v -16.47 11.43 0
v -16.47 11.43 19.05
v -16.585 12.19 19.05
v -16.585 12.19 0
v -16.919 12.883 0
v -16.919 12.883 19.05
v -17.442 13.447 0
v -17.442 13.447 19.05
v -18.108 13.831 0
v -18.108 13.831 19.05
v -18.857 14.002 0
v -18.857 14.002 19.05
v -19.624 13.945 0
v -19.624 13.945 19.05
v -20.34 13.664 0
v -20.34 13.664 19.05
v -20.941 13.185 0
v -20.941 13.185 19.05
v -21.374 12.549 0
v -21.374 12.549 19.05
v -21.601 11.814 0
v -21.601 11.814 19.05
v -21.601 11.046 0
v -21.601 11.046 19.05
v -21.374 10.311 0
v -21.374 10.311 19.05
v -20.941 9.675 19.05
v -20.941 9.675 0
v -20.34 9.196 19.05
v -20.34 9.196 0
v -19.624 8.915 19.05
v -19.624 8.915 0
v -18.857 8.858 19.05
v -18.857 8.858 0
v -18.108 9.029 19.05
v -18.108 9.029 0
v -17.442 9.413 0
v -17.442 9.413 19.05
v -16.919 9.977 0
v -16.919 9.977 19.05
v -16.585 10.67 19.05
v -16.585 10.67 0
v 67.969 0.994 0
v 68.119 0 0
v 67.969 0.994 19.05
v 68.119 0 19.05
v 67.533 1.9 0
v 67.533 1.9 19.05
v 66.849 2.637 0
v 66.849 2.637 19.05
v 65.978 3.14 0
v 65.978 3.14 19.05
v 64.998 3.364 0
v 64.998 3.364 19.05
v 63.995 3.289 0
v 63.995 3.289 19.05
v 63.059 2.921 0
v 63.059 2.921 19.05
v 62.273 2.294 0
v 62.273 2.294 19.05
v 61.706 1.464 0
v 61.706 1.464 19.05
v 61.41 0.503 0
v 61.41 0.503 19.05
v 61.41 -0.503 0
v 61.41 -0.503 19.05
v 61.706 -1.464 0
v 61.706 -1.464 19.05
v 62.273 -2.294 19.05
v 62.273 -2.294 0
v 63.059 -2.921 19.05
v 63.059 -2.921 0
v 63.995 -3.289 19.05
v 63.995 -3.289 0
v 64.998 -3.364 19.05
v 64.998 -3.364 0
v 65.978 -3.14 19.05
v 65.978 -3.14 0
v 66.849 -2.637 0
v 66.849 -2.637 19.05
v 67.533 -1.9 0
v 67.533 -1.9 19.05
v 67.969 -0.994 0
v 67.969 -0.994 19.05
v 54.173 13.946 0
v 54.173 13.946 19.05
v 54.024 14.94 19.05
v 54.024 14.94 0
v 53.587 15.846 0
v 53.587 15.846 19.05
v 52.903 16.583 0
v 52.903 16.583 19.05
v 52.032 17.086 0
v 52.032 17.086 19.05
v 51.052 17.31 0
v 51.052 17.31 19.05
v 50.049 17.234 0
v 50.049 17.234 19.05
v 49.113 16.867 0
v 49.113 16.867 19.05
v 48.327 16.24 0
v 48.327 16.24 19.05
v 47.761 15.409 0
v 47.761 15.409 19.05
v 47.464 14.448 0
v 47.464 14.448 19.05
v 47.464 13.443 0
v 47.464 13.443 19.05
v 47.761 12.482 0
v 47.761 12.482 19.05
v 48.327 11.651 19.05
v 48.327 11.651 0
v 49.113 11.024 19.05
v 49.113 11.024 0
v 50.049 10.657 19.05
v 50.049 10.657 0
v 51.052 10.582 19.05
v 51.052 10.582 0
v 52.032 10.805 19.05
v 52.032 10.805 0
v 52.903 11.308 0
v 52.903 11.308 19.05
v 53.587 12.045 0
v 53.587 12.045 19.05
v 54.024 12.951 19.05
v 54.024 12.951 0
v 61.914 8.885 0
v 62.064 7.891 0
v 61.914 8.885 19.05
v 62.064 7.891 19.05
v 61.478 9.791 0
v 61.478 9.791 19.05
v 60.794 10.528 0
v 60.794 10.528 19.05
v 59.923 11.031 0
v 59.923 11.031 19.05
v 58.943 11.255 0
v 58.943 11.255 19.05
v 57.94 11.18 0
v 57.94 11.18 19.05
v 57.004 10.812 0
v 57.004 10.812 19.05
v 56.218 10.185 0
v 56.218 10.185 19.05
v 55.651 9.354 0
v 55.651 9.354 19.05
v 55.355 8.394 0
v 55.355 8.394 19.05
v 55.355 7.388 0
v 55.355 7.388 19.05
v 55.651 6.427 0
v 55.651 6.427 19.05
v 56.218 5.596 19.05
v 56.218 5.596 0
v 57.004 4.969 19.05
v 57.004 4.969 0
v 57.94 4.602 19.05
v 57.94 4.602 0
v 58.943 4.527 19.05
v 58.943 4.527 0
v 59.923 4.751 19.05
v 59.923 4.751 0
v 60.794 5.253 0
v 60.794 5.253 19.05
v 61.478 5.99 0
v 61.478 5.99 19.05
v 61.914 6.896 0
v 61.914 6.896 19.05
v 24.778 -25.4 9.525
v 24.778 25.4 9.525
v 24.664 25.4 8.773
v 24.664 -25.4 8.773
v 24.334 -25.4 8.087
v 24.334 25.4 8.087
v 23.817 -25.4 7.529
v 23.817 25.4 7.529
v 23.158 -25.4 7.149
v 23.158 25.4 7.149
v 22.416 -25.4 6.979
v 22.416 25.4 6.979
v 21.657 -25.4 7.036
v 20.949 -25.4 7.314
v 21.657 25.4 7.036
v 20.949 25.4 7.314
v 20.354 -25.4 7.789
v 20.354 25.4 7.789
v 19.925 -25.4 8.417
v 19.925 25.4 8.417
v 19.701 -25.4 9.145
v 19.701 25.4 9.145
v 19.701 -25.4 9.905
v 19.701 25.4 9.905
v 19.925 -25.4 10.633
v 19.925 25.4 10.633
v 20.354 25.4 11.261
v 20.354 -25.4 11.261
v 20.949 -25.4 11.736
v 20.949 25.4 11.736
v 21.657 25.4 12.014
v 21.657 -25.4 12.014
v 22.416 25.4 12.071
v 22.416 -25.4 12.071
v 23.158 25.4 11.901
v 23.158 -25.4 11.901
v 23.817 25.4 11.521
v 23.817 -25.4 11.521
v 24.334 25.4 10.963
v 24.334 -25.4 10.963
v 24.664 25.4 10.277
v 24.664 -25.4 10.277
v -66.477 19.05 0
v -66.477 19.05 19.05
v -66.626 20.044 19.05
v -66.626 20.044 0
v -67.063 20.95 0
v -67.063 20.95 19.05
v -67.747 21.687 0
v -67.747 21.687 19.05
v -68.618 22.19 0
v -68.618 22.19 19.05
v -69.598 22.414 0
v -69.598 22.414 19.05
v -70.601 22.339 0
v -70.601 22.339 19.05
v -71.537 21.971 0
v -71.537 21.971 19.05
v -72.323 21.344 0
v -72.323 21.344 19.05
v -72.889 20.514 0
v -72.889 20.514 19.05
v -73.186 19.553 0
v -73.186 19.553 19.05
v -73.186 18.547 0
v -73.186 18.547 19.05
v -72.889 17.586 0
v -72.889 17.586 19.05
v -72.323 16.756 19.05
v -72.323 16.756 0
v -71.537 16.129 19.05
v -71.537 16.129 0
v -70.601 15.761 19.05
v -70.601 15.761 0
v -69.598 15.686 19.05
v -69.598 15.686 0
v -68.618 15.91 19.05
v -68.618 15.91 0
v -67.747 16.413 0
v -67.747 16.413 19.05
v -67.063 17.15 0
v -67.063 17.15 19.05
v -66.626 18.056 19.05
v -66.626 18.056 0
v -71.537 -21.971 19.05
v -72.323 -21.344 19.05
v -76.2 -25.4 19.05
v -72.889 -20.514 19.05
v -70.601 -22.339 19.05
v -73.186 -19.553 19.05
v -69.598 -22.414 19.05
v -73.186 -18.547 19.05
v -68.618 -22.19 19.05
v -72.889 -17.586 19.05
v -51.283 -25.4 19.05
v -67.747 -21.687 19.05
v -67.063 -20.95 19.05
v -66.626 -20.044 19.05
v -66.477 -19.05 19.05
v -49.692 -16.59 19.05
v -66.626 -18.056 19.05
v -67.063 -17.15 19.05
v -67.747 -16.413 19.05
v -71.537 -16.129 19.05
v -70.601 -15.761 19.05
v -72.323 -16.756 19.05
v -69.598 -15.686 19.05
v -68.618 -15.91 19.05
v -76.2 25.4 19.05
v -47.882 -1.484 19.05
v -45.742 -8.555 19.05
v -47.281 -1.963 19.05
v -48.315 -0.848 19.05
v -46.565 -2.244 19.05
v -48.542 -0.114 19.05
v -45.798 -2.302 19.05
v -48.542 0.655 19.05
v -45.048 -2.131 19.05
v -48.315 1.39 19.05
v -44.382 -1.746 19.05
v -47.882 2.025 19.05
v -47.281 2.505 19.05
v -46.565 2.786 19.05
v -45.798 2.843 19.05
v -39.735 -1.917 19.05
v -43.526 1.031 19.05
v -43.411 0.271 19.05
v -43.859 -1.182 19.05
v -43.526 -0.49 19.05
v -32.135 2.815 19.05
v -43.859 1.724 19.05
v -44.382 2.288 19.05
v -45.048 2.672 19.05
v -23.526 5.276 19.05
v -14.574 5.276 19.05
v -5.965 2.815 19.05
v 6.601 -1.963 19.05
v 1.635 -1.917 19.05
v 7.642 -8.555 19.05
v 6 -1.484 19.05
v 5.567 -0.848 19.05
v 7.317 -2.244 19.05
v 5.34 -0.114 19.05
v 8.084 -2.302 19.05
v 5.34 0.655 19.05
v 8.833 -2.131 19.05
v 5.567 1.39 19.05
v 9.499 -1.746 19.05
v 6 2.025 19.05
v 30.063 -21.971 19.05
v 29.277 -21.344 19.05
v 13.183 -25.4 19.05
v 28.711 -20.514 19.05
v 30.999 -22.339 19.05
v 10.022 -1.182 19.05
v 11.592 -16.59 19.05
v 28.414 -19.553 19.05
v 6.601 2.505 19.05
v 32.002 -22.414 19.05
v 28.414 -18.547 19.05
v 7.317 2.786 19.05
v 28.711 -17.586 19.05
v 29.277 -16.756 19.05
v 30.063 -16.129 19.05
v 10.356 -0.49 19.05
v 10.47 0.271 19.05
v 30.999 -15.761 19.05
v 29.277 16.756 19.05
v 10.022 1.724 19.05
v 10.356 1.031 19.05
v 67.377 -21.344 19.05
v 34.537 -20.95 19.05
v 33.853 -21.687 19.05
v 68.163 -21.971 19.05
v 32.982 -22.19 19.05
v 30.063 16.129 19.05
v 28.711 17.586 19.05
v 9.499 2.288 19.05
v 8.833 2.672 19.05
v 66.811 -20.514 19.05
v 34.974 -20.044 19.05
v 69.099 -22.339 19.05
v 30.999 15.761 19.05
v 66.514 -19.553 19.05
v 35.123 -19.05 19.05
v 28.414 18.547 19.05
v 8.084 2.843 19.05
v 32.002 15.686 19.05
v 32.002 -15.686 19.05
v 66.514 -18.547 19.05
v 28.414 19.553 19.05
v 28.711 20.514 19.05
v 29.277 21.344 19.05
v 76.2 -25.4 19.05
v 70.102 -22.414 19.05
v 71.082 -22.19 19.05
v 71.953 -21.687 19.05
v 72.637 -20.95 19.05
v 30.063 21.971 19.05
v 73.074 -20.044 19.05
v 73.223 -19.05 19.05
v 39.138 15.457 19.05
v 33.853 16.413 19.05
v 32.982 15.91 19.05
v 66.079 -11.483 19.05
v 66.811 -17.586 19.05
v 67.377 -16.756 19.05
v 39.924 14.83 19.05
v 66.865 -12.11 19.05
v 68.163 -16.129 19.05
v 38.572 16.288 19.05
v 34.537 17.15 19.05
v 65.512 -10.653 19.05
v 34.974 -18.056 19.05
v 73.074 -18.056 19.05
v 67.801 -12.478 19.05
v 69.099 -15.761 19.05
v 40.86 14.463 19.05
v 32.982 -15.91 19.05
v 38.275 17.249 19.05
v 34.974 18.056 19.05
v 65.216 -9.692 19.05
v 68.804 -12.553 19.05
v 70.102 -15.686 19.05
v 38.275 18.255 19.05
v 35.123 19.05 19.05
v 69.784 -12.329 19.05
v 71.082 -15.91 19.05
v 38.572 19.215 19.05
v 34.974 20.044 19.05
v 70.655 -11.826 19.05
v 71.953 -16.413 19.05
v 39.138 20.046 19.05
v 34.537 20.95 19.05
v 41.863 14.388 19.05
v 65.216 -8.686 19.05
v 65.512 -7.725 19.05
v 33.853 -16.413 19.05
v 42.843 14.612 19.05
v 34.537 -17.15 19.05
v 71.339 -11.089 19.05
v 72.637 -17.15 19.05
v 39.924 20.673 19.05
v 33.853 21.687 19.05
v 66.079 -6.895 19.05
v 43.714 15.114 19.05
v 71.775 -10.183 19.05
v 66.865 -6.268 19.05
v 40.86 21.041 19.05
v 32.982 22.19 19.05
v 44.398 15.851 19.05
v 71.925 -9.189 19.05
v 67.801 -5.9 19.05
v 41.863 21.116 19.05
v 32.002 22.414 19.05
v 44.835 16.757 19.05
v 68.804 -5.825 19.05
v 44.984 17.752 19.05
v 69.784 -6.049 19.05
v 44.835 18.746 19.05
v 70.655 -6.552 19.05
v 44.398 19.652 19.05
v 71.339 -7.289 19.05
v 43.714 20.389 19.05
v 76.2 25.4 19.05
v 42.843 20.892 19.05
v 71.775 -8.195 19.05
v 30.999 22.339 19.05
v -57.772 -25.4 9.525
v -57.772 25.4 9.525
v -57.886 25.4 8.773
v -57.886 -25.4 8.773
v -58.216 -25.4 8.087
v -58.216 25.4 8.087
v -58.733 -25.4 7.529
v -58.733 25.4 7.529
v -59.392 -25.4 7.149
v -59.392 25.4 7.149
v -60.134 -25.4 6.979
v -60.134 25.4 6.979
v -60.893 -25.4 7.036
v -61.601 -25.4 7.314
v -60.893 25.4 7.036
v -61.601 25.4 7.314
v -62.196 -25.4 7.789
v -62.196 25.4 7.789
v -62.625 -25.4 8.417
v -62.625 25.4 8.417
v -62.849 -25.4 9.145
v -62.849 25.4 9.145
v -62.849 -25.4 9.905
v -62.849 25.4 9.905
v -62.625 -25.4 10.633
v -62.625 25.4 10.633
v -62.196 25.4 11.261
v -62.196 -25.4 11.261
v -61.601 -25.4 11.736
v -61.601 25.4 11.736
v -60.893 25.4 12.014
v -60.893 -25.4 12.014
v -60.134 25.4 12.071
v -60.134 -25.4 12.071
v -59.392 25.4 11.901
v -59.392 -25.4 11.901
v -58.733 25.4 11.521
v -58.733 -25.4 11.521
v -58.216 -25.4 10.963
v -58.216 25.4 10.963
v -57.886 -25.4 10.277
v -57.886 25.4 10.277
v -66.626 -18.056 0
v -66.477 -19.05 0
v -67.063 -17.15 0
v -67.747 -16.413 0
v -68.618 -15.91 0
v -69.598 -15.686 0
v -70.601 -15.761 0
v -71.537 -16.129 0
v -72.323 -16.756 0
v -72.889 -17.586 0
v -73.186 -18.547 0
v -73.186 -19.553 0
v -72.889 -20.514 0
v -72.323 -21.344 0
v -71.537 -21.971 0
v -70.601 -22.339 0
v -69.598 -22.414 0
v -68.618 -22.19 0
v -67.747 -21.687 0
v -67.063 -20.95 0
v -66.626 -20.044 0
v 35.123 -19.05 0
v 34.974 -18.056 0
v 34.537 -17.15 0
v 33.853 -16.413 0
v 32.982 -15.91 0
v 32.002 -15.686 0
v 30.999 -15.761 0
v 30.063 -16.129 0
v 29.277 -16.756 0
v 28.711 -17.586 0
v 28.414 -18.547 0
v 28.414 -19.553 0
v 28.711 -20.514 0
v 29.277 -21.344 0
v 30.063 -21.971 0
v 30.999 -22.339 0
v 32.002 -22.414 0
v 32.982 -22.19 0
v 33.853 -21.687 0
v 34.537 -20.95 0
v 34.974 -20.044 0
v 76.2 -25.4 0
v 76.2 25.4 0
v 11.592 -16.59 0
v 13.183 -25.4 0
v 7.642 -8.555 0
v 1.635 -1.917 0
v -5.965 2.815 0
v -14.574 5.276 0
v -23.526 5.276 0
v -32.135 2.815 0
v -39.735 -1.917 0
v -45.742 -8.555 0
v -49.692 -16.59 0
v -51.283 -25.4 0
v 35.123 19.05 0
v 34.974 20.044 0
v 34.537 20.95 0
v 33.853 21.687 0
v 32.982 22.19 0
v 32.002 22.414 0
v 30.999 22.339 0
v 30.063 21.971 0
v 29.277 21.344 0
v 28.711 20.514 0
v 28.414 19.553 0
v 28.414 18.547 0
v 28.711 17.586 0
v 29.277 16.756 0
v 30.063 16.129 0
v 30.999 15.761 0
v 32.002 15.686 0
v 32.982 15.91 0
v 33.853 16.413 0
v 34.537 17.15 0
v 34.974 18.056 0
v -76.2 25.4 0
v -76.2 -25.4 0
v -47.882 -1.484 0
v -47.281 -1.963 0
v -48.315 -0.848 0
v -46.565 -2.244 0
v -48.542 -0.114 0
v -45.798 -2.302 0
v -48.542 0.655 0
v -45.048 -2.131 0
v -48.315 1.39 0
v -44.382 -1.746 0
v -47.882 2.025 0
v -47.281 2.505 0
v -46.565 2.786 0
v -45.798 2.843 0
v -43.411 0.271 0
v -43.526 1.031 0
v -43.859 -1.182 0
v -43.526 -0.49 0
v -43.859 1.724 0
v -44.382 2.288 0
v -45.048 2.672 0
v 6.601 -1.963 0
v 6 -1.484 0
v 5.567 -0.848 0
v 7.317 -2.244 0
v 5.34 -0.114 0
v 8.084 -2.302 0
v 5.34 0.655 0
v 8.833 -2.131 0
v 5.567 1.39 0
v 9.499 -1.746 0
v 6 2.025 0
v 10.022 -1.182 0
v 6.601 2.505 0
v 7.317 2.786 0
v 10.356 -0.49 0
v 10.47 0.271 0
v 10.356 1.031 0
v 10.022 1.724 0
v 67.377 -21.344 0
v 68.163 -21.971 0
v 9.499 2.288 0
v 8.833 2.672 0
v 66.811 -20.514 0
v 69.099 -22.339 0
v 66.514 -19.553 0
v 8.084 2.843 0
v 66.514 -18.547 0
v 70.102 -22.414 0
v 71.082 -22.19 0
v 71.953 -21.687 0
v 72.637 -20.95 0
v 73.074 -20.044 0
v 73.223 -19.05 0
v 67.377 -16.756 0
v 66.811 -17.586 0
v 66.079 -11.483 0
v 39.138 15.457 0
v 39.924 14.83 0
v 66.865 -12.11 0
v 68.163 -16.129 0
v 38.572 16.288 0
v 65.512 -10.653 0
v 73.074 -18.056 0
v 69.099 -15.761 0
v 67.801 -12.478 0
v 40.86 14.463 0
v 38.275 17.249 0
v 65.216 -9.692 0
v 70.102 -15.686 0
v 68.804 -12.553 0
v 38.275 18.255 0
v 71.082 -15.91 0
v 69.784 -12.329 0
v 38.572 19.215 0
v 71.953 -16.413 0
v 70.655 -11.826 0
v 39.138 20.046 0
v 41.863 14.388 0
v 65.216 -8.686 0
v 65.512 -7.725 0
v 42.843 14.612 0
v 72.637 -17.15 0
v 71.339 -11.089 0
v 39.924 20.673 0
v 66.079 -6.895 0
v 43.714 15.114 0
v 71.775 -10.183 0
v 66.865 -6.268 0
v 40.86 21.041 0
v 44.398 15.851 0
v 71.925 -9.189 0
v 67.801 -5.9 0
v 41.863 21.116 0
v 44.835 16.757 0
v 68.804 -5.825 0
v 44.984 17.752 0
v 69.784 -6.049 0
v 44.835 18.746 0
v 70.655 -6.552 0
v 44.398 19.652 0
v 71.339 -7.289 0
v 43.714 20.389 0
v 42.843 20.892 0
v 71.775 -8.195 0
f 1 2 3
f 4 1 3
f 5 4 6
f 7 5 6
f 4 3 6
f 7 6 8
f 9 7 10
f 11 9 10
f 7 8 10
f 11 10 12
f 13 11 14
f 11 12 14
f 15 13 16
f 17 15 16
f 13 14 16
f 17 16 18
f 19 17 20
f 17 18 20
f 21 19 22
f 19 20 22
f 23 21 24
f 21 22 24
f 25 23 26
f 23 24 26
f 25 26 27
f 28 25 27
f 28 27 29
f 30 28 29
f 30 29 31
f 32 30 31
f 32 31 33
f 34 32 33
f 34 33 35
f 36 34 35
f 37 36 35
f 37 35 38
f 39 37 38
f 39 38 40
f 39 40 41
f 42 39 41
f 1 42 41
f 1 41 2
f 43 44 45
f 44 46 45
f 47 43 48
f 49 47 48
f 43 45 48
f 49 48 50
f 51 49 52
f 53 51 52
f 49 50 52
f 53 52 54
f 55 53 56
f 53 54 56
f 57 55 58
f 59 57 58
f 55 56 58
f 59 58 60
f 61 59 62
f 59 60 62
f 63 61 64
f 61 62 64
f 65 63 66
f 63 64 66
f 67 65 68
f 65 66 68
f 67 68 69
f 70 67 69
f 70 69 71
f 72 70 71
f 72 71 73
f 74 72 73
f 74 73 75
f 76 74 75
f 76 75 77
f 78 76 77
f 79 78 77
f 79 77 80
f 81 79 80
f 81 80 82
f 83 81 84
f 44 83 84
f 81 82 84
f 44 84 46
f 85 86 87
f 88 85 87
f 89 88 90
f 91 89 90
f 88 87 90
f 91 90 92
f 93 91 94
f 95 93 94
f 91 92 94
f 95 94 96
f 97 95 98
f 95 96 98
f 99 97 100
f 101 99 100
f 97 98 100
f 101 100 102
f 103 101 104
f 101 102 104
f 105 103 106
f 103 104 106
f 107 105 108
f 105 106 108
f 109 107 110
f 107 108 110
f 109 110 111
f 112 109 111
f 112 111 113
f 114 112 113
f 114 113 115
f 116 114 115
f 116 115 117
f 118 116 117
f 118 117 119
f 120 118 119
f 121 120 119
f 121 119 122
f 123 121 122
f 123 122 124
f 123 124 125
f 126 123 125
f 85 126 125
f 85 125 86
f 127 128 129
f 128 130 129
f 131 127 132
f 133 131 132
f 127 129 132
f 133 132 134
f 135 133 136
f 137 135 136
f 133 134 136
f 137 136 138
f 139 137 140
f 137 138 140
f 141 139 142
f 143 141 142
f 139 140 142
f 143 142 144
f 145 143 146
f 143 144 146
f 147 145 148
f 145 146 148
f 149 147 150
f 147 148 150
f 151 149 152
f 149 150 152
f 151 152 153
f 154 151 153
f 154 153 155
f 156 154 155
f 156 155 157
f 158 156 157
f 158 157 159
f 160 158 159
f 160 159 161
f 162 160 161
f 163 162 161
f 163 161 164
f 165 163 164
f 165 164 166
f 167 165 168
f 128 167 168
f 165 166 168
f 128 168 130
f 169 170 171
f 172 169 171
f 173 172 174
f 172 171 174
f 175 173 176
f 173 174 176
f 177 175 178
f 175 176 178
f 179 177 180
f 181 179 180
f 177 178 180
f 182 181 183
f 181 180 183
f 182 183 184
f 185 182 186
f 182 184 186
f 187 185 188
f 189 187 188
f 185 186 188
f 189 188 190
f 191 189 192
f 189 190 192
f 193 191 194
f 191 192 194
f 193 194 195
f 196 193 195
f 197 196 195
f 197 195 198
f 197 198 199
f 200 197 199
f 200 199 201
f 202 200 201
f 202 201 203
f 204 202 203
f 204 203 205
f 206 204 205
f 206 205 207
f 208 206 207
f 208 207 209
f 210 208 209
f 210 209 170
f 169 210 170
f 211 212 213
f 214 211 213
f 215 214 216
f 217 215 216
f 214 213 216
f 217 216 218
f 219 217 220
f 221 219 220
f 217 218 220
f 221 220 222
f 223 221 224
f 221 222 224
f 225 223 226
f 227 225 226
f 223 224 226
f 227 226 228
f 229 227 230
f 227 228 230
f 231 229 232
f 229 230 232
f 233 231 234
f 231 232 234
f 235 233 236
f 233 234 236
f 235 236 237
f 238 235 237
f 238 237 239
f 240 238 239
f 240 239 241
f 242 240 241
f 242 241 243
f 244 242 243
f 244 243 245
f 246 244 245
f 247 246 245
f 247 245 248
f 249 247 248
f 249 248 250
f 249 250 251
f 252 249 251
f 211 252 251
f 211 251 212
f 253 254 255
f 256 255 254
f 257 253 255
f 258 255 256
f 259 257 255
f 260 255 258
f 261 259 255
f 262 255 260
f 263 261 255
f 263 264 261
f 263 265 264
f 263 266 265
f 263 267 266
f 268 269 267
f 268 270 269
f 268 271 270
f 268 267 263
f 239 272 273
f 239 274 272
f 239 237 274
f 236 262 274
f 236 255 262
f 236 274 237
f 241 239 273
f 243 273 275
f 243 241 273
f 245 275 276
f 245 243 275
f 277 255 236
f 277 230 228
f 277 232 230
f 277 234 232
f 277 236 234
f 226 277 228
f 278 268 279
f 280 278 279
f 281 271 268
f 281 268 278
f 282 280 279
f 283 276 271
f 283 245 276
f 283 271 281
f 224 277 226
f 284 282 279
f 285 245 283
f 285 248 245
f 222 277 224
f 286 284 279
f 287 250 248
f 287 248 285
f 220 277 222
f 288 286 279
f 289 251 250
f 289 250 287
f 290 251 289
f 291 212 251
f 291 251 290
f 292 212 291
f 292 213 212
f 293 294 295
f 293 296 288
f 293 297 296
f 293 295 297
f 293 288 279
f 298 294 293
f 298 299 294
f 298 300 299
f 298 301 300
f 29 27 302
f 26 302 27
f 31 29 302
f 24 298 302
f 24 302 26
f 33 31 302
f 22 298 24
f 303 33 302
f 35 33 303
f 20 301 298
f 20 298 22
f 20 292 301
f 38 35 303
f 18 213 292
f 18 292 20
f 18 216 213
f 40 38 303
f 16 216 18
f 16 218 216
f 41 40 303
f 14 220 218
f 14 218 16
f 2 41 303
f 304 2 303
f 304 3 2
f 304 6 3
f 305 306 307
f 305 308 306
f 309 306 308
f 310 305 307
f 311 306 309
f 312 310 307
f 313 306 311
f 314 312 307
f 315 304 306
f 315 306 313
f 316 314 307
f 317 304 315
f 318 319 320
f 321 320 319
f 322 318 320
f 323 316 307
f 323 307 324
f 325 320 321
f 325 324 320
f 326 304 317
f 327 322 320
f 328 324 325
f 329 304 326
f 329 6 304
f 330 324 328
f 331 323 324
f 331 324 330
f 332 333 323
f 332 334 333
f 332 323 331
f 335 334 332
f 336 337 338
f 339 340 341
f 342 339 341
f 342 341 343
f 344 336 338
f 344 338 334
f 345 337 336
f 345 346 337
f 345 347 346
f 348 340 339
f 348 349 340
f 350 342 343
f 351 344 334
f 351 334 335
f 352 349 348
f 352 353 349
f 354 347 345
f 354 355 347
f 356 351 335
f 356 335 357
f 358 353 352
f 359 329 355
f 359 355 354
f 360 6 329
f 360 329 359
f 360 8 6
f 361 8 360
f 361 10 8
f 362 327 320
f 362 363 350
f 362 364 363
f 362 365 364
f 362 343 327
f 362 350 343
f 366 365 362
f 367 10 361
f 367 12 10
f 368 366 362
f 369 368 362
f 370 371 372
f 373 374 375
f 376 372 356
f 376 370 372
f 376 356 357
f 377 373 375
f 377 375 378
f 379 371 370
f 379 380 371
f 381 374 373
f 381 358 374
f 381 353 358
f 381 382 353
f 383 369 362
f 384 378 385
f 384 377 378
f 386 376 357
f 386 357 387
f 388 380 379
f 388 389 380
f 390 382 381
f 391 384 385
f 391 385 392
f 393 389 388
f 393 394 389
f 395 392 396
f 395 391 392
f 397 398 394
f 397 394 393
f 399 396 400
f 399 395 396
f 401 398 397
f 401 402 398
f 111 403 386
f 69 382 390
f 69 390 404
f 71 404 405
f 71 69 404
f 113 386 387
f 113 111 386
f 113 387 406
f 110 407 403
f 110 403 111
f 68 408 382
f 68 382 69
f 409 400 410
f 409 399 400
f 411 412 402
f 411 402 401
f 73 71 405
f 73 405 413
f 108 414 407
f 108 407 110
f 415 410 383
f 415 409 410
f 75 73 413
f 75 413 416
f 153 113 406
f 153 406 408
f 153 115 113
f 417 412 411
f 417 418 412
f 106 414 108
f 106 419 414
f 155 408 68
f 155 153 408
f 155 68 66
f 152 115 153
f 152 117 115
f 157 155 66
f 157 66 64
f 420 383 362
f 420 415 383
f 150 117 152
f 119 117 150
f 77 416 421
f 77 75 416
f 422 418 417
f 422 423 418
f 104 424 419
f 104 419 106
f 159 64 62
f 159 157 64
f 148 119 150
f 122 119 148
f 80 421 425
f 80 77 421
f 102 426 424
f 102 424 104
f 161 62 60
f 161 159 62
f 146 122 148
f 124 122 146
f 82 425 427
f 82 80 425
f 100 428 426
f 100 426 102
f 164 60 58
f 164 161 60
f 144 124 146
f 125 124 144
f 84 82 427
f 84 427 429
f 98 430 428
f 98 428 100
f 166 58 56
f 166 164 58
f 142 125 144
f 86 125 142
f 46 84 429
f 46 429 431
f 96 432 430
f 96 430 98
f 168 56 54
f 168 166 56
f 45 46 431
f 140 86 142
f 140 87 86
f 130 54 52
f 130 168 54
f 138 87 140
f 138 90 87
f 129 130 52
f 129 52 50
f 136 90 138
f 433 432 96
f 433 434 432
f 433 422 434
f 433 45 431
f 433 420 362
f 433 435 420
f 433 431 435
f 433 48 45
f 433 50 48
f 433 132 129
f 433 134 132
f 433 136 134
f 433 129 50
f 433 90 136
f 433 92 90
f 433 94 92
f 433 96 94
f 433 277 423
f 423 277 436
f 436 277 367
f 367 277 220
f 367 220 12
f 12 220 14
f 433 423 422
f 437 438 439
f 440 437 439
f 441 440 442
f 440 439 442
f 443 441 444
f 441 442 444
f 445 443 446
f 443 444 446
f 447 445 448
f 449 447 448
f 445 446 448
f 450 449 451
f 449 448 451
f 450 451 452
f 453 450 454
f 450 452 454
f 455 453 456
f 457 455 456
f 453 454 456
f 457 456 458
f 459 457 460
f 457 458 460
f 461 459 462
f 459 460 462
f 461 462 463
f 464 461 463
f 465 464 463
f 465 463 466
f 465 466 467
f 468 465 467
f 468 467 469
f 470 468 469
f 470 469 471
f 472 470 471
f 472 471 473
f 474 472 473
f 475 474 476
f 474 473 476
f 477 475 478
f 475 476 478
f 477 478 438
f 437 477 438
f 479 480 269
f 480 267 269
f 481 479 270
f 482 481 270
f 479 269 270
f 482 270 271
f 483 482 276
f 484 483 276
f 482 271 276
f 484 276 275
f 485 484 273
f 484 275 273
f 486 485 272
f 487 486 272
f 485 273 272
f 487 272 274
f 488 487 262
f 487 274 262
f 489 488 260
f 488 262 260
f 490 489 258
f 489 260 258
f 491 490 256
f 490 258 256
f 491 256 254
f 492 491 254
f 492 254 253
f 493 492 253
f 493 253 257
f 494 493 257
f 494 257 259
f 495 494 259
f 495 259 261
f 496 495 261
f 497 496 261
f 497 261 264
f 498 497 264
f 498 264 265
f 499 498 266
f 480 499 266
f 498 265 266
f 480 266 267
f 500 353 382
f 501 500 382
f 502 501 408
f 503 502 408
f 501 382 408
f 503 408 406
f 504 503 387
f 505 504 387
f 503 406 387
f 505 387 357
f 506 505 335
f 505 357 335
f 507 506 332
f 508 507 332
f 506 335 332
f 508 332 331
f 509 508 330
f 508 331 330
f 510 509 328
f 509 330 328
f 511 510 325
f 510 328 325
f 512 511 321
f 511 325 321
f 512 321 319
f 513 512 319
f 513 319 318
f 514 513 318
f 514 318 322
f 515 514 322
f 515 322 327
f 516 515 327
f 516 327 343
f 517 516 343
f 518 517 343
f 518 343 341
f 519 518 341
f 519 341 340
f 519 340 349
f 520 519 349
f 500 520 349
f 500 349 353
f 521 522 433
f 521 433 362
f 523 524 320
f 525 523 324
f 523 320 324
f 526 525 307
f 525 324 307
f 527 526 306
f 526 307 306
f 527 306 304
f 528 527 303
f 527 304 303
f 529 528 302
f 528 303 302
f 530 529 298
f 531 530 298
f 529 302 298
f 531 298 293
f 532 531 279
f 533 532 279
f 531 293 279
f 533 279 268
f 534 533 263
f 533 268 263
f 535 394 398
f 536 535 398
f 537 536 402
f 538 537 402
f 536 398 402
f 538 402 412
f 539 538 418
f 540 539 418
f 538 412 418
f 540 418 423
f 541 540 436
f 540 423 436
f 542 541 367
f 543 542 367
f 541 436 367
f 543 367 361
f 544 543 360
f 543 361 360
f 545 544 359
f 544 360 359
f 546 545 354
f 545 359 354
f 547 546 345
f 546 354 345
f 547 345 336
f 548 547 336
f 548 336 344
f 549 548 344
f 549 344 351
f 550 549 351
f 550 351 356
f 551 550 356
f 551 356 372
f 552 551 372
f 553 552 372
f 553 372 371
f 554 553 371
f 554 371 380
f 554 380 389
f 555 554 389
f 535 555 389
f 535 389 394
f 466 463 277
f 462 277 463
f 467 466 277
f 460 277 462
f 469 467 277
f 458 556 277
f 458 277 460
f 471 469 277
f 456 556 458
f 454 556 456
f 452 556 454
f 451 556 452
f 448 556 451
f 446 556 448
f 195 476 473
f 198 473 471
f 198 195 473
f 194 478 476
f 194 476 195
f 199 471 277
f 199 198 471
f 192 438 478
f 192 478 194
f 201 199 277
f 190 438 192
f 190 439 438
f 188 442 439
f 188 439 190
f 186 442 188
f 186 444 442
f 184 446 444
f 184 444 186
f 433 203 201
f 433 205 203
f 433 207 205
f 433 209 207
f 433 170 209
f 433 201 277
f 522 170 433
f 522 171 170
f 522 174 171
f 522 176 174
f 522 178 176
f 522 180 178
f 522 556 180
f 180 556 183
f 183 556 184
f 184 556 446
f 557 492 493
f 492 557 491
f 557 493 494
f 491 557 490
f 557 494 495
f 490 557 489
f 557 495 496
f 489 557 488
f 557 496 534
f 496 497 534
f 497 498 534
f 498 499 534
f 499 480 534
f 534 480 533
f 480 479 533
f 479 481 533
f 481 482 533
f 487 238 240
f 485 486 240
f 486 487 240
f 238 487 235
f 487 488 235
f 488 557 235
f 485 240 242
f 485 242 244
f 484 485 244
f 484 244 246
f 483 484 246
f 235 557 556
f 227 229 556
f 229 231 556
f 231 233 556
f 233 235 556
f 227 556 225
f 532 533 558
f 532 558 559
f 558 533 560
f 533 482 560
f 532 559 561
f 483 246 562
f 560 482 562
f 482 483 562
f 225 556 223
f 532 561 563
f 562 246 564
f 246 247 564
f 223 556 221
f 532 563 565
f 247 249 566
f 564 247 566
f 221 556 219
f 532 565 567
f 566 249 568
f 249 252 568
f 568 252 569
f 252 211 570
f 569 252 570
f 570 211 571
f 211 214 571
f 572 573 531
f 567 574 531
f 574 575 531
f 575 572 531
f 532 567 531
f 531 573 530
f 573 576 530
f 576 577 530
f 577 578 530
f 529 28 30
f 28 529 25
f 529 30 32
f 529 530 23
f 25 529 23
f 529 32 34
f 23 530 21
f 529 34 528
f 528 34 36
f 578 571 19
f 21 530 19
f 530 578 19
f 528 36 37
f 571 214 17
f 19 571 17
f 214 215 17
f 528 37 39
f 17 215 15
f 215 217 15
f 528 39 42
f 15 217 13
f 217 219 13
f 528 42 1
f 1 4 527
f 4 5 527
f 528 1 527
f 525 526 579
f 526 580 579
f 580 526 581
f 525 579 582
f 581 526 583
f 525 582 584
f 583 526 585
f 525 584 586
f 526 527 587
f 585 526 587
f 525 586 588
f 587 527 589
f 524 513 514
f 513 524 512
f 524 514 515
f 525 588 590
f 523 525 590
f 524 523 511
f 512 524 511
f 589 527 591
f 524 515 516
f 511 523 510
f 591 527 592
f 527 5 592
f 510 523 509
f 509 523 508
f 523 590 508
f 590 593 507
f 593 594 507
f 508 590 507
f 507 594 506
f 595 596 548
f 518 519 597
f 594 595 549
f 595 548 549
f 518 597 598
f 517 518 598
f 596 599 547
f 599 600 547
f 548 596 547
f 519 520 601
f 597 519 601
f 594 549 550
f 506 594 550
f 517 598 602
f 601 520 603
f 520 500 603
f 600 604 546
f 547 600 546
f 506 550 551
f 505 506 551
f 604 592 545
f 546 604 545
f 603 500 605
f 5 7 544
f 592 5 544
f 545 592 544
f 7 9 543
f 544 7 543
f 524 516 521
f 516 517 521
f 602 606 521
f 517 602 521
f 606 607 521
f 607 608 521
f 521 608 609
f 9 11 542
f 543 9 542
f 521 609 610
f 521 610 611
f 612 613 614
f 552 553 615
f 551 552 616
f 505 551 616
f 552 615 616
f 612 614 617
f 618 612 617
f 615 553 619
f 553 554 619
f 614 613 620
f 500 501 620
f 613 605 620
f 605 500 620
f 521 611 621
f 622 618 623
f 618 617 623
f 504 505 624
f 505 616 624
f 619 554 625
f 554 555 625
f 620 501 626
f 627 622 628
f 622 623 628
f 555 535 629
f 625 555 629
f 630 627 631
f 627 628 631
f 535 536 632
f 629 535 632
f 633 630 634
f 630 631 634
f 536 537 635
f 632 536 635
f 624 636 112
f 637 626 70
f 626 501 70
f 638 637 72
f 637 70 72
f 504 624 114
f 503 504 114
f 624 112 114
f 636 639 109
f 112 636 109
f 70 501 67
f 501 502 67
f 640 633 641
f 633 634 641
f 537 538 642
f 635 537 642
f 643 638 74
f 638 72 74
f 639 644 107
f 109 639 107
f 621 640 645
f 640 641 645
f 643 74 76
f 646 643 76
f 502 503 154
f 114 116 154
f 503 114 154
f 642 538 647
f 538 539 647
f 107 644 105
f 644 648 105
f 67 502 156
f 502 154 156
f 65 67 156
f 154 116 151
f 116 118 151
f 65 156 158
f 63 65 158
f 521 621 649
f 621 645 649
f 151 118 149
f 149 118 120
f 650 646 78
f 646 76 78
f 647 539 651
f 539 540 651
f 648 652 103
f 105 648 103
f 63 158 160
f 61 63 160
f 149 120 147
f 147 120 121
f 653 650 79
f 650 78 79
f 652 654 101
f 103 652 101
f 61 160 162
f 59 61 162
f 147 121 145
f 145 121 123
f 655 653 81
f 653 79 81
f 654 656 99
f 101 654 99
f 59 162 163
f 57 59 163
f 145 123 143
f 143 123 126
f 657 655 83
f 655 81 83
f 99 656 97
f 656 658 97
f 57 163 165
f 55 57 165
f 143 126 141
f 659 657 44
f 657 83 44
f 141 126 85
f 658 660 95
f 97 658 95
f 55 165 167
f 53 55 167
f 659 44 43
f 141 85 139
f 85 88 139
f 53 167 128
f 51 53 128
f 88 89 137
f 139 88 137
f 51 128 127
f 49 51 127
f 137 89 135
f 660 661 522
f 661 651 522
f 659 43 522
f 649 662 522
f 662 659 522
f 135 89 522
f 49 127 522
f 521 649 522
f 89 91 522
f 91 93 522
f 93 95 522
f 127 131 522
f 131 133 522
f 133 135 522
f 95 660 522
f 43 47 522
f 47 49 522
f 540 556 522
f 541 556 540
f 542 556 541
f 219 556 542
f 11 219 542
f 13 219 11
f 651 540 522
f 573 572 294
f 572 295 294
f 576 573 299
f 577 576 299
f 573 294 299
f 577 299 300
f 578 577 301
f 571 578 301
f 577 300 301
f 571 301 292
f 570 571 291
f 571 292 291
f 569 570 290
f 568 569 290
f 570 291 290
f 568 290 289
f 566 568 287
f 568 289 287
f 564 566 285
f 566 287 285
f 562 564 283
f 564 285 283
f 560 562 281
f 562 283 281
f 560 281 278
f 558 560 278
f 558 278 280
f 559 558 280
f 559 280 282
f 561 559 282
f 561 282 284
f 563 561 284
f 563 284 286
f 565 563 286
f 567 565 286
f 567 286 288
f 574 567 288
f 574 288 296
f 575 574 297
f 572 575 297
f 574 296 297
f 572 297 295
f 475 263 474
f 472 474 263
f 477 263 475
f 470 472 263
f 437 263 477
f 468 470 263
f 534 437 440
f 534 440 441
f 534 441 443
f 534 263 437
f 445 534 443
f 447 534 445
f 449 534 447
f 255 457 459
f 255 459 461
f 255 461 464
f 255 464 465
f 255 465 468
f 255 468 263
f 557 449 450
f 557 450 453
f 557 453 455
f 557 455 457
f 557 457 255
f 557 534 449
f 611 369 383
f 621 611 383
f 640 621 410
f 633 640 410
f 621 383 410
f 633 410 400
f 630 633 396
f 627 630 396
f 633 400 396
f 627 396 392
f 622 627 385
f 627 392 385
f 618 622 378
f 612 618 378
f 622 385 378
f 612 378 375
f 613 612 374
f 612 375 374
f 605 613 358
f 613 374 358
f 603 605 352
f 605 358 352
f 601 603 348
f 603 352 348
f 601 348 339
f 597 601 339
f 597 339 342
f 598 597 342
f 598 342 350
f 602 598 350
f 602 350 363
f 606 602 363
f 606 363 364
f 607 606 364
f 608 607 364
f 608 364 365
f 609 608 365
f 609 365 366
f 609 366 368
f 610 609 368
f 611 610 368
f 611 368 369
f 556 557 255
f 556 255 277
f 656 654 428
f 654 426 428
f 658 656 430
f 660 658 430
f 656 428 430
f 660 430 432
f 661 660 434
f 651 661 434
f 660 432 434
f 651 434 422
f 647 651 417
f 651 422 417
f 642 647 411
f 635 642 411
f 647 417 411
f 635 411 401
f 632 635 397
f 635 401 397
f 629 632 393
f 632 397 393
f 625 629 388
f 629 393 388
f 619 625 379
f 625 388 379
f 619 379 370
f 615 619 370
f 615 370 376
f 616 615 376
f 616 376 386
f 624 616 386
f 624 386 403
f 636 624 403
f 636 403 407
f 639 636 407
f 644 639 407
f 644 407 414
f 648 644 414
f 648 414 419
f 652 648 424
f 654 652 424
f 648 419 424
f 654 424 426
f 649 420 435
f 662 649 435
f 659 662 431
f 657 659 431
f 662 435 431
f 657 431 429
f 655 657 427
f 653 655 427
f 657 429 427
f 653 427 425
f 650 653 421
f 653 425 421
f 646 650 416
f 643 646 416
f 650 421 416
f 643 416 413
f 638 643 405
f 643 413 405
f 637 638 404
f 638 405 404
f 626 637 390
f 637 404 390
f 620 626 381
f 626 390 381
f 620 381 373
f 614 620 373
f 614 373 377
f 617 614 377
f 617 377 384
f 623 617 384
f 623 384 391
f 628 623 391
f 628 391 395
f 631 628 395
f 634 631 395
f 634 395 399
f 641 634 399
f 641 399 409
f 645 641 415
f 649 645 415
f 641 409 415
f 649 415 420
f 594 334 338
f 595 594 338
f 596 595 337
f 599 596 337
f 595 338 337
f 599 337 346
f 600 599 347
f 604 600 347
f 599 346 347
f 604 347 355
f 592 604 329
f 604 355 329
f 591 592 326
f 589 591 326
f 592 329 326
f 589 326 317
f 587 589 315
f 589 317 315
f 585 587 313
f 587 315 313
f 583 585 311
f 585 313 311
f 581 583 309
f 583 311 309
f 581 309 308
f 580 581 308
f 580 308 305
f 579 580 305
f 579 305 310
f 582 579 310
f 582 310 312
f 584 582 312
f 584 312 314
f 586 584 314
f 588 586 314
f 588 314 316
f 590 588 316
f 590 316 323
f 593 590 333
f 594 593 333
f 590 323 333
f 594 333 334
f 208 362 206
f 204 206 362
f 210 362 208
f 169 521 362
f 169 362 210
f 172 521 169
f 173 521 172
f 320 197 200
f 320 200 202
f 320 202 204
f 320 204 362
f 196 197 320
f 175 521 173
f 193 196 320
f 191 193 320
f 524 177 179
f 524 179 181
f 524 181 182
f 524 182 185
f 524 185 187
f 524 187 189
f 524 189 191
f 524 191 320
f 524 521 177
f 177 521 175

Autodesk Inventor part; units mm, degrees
ref_plane "YZ Plane" through (0, 0, 0) normal (1, 0, 0) x (0, 1, 0)
ref_plane "XZ Plane" through (0, 0, 0) normal (0, 1, 0) x (-1, 0, 0)
ref_plane "XY Plane" through (0, 0, 0) normal (0, 0, 1) x (1, 0, 0)
sketch "Sketch1" plane through (0, 0, 0) normal (0, 0, 1) x (1, 0, 0)
  line L0 (76.2, -25.4) -> (-76.2, -25.4)
  line L1 (-76.2, -25.4) -> (-76.2, 25.4)
  line L2 (-76.2, 25.4) -> (76.2, 25.4)
  line L3 (76.2, 25.4) -> (76.2, -25.4)
  line L4 (76.2, -25.4) -> (-76.2, 25.4) construction
  line L5 (-76.2, -25.4) -> (76.2, 25.4) construction
  point P0 (0, 0)
  dimension "d0" = 50.8
  dimension "d1" = 152.4
extrude "Extrusion1" add sketch "Sketch1" along normal blind 19.05
sketch "Sketch2" plane through (0, 0, 19.05) normal (0, 0, 1) x (1, 0, 0)
  line L0 (76.2, 25.4) -> (-76.2, 25.4) projected
  line L1 (-76.2, 25.4) -> (-76.2, -25.4) projected
  circle A0 centre (-19.05, -26.67) radius 32.258
  line L2 (-76.2, -25.4) -> (76.2, -25.4) projected
  point P0 (0, 0)
  dimension "d15" = 1.27
  dimension "d16" = 64.516
  dimension "d40" = 57.15
extrude "Extrusion2" cut sketch "Sketch2" against normal through all
sketch "Sketch3" plane through (-76.2, 25.4, 0) normal (0, 1, 0) x (1, 0, 0)
  circle A0 centre (15.875, -9.525) radius 2.5527
  line L0 (152.4, 0) -> (0, 0) projected
  circle A1 centre (98.425, -9.525) radius 2.5527
  line L1 (57.15, -22.86) -> (57.15, 3.81) projected
  dimension "d19" = 5.1054
  dimension "d20" = 9.525
  dimension "d24" = 82.55
  dimension "d41" = 41.275
extrude "Extrusion3" cut sketch "Sketch3" against normal through all
sketch "Sketch4" plane through (0, 0, 19.05) normal (0, 0, 1) x (1, 0, 0)
  circle A0 centre (-45.9908, 0.2708) radius 2.5797
  arc A1 (13.183, -25.4) -> (-51.283, -25.4) centre (-19.05, -26.67) ccw projected
  circle A2 centre (-19.05, 11.43) radius 2.5797
  circle A3 centre (7.8908, 0.2708) radius 2.5797
  line L0 (-19.05, -26.67) -> (-19.05, -17.7805)
  dimension "d31" = 5.1594
  dimension "d32" = 38.1
  dimension "d36" = 90
  dimension "d42" = 45
extrude "Extrusion4" cut sketch "Sketch4" against normal through all
sketch "Sketch5" plane through (0, 0, 19.05) normal (0, 0, 1) x (1, 0, 0)
  circle A0 centre (-69.85, -19.05) radius 3.3734
  arc A1 (13.183, -25.4) -> (-51.283, -25.4) centre (-19.05, -26.67) ccw projected
  line L0 (-76.2, -25.4) -> (-51.283, -25.4) projected
  line L1 (-76.2, 25.4) -> (-76.2, -25.4) projected
  circle A2 centre (-69.85, 19.05) radius 3.3734
  circle A3 centre (31.75, -19.05) radius 3.3734
  circle A4 centre (31.75, 19.05) radius 3.3734
  circle A5 centre (41.611, 17.7518) radius 3.3734
  circle A6 centre (50.8, 13.9456) radius 3.3734
  circle A7 centre (58.6908, 7.8908) radius 3.3734
  circle A8 centre (64.7456, 0) radius 3.3734
  circle A9 centre (68.5518, -9.189) radius 3.3734
  circle A10 centre (69.85, -19.05) radius 3.3734
  point P0 (0, 0)
  dimension "d43" = 6.7469
  dimension "d44" = 50.8
  dimension "d45" = 6.35
  dimension "d55" = 38.1
  dimension "d58" = 101.6
  dimension "d63" = 90
extrude "Extrusion5" cut sketch "Sketch5" against normal through all
equation "\"d24\" = 2 * d41"
equation "\"d58\" = 2 * d44"
properties part number "ShooterSeperableClampB"
